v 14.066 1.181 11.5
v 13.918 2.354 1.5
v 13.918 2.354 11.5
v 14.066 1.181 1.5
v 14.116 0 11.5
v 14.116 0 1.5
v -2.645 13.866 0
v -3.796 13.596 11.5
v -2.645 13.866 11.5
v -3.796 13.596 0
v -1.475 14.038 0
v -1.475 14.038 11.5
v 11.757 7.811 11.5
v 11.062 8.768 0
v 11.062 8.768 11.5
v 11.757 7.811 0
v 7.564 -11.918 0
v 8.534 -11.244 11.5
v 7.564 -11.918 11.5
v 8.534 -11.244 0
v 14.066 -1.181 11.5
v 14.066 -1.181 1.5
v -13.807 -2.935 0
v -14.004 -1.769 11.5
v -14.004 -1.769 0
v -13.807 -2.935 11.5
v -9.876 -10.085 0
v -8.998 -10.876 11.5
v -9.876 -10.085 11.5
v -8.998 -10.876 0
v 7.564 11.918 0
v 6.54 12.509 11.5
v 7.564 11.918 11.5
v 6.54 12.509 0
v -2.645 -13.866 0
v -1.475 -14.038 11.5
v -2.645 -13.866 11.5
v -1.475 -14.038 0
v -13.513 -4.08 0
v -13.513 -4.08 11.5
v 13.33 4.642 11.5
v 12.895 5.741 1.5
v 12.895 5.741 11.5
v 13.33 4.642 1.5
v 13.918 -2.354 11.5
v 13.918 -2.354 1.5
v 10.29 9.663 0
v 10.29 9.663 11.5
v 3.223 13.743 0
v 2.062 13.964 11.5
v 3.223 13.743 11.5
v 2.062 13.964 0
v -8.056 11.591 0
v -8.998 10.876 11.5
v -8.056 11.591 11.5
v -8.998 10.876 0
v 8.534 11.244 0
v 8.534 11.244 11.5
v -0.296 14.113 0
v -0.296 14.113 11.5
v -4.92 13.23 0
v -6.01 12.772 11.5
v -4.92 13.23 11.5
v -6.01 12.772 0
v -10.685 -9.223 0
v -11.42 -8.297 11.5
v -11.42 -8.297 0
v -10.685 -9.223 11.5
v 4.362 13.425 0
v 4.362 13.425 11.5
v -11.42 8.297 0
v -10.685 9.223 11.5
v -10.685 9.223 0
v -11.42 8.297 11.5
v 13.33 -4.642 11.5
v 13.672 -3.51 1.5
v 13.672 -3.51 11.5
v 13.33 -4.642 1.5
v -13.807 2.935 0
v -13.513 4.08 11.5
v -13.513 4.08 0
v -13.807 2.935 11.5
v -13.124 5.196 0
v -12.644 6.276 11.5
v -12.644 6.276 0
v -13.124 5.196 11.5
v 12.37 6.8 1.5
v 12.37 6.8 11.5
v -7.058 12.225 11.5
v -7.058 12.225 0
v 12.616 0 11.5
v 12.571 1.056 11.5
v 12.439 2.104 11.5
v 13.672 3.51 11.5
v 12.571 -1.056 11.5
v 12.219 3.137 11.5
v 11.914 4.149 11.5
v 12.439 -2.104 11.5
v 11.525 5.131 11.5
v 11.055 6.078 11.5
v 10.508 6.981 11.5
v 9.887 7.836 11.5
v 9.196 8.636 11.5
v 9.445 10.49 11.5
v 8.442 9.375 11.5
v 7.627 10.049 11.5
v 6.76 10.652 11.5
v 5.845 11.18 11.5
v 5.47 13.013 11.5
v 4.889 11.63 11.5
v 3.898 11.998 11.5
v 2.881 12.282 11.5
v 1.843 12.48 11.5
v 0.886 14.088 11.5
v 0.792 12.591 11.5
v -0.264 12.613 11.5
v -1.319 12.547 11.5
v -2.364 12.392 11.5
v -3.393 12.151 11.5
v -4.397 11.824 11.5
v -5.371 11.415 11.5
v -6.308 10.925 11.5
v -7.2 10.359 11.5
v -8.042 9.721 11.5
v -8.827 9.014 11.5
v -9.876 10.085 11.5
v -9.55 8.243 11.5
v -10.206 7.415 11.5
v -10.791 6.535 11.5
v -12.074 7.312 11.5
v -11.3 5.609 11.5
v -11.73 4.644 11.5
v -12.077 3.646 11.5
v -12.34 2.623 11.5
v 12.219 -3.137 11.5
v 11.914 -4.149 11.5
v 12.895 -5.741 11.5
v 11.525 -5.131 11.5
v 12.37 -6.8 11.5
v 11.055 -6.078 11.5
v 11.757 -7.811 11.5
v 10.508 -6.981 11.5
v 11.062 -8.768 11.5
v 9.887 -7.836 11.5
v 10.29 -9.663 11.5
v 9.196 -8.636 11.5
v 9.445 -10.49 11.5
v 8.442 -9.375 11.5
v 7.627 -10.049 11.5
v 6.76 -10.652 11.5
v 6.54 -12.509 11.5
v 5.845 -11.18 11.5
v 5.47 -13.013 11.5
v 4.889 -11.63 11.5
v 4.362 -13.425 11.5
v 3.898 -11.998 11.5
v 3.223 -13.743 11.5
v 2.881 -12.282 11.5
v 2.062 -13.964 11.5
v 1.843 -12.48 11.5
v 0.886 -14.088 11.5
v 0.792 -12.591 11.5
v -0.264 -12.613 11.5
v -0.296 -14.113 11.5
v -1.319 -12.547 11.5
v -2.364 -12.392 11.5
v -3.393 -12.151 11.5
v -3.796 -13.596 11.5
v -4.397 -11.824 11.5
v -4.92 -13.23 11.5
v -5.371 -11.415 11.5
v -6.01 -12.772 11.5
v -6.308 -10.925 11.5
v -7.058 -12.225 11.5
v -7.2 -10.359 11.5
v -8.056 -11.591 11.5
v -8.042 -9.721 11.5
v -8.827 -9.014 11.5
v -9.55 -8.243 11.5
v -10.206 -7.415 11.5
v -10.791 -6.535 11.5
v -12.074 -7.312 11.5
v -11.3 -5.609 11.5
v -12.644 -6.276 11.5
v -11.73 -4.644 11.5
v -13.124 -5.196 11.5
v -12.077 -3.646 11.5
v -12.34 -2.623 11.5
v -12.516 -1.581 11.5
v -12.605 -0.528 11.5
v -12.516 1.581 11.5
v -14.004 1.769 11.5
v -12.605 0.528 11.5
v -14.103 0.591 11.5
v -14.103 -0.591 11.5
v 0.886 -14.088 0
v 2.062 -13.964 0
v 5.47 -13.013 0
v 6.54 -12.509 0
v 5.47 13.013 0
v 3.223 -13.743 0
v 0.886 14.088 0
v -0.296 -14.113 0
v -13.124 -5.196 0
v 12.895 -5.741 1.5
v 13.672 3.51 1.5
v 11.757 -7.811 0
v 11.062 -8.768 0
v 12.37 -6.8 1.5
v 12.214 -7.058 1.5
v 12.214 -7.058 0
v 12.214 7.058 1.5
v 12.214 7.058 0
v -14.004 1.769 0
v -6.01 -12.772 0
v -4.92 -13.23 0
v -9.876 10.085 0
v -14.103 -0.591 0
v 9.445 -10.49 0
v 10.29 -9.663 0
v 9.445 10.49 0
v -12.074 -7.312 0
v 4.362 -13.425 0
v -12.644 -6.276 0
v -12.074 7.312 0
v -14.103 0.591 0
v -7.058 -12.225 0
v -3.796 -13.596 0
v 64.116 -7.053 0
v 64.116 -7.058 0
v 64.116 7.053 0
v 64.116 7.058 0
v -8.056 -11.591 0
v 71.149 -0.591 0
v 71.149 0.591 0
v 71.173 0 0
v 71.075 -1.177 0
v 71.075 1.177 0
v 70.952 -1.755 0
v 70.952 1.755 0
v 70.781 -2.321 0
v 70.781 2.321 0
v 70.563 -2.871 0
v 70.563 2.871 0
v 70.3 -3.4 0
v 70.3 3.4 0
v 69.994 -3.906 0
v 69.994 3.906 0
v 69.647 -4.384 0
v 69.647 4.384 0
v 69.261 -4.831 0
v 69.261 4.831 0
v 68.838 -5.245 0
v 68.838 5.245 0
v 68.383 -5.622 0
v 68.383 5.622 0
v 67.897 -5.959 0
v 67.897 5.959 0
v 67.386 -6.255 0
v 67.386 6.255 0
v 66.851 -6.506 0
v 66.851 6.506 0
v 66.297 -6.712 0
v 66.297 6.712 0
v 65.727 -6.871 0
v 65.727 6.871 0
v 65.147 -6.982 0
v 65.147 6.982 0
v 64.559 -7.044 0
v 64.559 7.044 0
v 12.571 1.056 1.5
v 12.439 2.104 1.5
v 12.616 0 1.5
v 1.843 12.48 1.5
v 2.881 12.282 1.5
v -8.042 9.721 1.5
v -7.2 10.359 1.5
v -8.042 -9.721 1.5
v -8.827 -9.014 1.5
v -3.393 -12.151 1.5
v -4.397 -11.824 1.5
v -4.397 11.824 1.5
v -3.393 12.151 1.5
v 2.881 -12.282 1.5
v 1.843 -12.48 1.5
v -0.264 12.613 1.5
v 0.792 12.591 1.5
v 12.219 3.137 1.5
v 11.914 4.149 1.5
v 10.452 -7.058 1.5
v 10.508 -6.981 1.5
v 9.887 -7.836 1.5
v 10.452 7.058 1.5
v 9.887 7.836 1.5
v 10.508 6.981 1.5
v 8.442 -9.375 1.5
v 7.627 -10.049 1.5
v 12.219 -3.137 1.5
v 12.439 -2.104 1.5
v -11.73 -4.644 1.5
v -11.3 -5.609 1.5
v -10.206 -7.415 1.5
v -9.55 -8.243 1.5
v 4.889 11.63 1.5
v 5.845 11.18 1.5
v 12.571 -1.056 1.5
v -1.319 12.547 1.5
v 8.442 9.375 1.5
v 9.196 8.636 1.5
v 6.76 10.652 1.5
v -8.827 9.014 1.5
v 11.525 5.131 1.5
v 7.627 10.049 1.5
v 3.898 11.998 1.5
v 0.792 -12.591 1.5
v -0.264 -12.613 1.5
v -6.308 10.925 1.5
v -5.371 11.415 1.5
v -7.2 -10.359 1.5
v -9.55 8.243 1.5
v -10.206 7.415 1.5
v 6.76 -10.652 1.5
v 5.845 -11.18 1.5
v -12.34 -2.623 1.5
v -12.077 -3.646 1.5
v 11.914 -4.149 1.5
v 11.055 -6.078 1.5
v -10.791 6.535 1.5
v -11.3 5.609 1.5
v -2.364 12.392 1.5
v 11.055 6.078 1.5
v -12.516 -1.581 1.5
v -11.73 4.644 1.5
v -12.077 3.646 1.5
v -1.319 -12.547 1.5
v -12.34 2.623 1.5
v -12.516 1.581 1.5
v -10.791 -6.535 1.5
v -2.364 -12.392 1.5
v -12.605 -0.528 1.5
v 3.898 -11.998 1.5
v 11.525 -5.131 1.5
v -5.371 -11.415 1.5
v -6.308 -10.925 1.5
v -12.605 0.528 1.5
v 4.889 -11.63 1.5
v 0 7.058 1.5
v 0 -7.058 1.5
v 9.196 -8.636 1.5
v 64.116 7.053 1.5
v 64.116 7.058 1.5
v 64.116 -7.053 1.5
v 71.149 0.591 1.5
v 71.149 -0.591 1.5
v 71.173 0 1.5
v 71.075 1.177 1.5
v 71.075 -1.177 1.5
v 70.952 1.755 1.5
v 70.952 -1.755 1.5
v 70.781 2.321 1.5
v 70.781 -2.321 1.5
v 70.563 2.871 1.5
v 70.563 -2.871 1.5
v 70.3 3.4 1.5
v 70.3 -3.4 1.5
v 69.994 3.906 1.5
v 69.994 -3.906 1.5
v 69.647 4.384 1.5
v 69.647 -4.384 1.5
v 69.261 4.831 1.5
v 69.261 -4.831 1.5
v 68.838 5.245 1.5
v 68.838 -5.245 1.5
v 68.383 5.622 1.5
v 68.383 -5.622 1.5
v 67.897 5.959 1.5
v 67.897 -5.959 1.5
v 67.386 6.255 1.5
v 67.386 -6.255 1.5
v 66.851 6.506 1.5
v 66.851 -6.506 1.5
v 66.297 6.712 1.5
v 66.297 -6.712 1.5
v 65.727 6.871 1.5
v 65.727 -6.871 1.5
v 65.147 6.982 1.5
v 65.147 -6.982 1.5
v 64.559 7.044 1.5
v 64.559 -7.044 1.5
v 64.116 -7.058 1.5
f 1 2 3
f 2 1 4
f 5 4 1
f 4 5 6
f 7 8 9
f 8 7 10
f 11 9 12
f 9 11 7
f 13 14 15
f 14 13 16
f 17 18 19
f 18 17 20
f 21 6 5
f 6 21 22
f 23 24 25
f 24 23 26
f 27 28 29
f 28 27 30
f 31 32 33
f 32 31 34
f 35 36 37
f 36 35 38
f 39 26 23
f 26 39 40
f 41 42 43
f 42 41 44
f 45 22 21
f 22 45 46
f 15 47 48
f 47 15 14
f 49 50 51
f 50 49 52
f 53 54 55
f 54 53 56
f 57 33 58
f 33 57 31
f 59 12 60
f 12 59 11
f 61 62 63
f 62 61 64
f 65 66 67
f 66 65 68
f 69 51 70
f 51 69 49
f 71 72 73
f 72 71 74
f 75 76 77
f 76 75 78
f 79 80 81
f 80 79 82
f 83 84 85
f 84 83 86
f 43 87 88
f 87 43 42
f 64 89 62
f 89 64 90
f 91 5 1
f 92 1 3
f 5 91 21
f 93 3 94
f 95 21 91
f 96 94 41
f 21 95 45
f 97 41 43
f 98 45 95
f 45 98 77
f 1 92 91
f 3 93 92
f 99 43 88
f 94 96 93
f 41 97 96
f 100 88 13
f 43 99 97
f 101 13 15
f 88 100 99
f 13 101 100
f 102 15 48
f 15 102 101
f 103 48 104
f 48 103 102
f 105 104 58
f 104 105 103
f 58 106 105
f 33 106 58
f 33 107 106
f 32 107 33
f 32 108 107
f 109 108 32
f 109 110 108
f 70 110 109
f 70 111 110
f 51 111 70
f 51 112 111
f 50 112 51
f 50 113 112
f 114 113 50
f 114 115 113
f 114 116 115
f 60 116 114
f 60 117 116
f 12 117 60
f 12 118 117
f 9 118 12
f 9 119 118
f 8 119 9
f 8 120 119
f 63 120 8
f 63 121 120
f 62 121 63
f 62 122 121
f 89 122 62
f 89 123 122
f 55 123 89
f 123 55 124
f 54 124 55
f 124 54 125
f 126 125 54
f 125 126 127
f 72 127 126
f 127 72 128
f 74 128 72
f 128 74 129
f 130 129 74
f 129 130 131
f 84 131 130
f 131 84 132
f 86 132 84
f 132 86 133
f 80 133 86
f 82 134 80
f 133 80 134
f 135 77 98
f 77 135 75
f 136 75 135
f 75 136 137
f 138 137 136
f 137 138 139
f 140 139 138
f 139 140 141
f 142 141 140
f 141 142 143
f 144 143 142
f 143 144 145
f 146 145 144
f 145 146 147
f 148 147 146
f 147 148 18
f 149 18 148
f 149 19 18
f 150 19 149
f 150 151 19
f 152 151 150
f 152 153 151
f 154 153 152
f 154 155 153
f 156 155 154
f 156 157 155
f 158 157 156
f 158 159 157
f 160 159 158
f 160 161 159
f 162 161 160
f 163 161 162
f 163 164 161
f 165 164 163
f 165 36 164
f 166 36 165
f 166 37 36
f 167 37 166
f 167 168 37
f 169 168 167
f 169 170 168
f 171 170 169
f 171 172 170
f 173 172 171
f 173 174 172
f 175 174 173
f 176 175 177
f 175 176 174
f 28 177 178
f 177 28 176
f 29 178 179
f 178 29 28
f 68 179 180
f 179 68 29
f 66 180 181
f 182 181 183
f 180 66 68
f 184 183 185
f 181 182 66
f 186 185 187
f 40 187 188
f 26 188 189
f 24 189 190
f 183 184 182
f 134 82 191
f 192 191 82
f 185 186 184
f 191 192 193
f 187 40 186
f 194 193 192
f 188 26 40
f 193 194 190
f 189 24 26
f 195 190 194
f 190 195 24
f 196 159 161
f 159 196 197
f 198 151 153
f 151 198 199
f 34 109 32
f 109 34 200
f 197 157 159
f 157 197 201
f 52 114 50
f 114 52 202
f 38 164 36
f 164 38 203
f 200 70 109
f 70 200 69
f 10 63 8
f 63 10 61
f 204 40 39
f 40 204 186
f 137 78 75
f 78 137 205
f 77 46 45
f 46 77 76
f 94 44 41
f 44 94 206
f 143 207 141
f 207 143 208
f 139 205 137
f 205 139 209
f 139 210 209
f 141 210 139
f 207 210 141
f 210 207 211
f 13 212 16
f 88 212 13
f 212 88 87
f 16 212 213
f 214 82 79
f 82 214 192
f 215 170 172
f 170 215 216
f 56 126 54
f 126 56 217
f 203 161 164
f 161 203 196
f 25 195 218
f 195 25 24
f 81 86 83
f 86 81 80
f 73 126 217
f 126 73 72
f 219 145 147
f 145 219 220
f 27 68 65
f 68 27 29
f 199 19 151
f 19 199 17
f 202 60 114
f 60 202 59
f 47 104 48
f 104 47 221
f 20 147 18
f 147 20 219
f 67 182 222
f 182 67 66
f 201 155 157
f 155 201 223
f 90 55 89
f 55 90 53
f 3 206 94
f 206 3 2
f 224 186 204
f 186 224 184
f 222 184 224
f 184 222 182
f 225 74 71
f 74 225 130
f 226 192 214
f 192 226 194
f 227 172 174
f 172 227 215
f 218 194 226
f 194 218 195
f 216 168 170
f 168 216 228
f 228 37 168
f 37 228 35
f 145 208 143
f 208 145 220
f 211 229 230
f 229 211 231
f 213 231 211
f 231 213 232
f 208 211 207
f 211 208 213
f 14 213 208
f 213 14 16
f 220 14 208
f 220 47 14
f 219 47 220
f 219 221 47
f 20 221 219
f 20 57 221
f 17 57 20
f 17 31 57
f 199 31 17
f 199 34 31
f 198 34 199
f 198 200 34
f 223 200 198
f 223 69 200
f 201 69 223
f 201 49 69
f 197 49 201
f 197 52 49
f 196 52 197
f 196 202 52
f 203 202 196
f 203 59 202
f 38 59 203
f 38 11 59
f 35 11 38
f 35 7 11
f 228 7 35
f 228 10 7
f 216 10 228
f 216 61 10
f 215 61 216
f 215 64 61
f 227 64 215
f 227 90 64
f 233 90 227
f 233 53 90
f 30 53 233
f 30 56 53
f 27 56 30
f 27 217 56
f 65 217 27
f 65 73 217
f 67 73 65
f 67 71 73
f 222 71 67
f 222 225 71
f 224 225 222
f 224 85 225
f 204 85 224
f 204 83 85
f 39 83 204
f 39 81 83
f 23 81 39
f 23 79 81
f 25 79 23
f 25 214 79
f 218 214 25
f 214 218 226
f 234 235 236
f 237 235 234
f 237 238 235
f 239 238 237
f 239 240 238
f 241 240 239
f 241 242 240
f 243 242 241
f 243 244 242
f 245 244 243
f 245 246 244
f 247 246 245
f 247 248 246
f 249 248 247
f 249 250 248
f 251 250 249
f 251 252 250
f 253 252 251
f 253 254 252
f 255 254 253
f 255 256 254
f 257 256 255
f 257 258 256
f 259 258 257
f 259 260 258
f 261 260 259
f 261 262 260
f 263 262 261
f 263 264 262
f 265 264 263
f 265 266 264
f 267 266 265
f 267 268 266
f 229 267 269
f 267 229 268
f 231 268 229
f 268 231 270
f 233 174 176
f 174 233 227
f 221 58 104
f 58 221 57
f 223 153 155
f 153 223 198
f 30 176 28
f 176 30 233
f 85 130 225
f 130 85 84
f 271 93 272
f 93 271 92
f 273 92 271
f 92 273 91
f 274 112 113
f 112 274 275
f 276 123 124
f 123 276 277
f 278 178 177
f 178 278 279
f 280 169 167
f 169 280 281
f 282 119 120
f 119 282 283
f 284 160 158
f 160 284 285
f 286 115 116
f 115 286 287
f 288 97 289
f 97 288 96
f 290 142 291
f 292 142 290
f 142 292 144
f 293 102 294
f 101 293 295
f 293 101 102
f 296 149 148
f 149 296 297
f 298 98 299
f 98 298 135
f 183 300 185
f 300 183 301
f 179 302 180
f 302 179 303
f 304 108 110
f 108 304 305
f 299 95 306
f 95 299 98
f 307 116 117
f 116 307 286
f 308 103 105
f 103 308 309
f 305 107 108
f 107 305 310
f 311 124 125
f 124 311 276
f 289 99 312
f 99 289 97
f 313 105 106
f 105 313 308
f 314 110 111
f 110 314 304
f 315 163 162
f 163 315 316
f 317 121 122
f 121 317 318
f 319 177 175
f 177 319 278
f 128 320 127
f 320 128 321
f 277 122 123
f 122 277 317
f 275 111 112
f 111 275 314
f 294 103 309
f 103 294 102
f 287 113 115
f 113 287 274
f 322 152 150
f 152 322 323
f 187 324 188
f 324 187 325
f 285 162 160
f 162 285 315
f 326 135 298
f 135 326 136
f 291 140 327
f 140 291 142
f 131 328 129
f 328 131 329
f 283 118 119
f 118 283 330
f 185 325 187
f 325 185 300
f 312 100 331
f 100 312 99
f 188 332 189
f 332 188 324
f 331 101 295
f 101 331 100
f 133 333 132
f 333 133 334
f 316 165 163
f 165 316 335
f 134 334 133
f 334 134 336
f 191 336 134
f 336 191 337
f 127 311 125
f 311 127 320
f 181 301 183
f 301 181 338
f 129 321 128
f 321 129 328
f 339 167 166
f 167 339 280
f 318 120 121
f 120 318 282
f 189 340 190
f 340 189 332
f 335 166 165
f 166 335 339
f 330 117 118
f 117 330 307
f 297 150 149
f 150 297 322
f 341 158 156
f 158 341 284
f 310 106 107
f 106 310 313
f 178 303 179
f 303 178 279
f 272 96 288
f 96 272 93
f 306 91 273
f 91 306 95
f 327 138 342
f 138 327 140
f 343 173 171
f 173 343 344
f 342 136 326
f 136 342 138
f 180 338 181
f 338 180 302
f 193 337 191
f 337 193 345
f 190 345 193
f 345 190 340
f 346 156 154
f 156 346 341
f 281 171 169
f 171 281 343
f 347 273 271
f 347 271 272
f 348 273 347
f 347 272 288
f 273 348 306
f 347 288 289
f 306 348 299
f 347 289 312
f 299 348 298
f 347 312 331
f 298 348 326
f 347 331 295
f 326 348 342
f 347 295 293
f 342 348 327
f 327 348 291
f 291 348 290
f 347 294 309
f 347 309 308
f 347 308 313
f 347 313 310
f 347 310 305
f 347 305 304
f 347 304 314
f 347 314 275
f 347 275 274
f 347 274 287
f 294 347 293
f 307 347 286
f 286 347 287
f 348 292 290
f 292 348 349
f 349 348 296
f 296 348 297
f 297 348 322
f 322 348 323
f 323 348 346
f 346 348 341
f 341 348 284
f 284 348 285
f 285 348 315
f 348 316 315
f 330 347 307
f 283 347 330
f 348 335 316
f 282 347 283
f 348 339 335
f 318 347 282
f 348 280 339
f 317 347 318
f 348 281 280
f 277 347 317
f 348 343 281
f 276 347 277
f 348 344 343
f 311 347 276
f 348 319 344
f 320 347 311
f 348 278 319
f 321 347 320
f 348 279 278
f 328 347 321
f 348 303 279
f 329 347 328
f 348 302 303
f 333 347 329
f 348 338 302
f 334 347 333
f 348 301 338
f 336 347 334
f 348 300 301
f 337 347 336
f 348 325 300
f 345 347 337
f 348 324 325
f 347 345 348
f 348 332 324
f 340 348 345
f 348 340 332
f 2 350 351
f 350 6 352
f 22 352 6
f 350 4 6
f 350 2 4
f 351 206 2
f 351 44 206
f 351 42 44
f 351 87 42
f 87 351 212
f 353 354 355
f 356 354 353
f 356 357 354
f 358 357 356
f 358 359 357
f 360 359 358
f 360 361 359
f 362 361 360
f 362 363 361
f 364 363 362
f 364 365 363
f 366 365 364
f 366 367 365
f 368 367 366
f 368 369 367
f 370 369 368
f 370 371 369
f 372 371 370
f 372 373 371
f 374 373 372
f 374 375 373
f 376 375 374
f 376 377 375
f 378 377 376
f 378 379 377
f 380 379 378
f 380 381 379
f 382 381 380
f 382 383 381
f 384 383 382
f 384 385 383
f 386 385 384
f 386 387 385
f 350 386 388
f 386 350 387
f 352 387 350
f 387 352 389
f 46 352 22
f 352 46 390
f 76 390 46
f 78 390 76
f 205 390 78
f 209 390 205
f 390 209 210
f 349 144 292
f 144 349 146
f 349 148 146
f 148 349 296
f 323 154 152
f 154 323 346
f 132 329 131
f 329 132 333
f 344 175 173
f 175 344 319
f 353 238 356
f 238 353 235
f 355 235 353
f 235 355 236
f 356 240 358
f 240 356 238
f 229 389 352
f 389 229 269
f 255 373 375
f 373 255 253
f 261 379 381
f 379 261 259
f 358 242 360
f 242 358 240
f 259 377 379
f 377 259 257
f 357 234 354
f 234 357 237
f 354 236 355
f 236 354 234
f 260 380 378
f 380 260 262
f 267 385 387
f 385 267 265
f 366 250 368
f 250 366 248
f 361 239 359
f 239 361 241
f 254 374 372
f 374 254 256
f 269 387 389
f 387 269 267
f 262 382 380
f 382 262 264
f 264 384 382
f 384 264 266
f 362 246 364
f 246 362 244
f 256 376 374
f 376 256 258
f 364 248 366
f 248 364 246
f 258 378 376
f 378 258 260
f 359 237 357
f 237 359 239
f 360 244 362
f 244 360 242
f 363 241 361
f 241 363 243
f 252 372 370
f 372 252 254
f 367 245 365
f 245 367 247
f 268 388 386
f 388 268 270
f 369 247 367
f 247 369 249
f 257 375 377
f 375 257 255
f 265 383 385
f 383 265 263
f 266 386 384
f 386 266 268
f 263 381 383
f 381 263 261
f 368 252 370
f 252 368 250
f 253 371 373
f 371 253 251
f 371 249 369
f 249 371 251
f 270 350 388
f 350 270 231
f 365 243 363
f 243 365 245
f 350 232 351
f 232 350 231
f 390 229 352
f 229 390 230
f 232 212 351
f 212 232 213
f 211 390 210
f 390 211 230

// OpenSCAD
//
// Parametric Cylindrical Measuring Spoon, v1.0, (c) by Abdelmadjid Hammou
// Remixed from: Parametric Metric Measuring Spoon V1.1 (c) by FMMT666(ASkr) (www.askrprojects.net)
//
// Licensed under a Creative Commons Attribution-ShareAlike 4.0 International License.
//
// You should have received a copy of the license along with this
// work. If not, see <http://creativecommons.org/licenses/by-sa/4.0/>.
//

// Volume of the spoon (mL)
volume =           5.0;
// Internal height of the spoon (mm)
bowlHeight =      10.0;
// Length of the grip (mm)
gripLength =      50.0;
// Width of the grip (mm) (0 = auto)
gripWidth =        0.0;
// Wall and grip thickness (mm)
thickness =        1.5;
// Include grip (useful for testing the size of the bowl with much faster prints)
GRIP =            true;    // [true, false]

/*[hidden]*/
CP   = 75; // arc resolution ($fn)
rad  = sqrt( (volume * 1000) / (PI * bowlHeight) );
rado = rad + thickness;
gripW = (gripWidth == 0) ? rado : gripWidth;

Spoon();

module Spoon() {
  // join bowl and grip
  union() {
    Bowl();
    if(GRIP)
      Grip();
  }
}

module Bowl() {
  difference() {
    cylinder(r = rado, h = bowlHeight + thickness, $fn = CP );
    translate([0, 0, thickness])
      cylinder(r = rad, h = bowlHeight + 1, $fn = CP );
  }
}

module Grip() {
  union() {
    // round end of the grip
    translate([ gripLength + rado, 0, 0])
      cylinder( r = gripW/2, h = thickness, $fn = CP );

    // the grip's body
    translate([0, -gripW/2, 0])
      cube([gripLength + rado, gripW, thickness]);
  }
}
